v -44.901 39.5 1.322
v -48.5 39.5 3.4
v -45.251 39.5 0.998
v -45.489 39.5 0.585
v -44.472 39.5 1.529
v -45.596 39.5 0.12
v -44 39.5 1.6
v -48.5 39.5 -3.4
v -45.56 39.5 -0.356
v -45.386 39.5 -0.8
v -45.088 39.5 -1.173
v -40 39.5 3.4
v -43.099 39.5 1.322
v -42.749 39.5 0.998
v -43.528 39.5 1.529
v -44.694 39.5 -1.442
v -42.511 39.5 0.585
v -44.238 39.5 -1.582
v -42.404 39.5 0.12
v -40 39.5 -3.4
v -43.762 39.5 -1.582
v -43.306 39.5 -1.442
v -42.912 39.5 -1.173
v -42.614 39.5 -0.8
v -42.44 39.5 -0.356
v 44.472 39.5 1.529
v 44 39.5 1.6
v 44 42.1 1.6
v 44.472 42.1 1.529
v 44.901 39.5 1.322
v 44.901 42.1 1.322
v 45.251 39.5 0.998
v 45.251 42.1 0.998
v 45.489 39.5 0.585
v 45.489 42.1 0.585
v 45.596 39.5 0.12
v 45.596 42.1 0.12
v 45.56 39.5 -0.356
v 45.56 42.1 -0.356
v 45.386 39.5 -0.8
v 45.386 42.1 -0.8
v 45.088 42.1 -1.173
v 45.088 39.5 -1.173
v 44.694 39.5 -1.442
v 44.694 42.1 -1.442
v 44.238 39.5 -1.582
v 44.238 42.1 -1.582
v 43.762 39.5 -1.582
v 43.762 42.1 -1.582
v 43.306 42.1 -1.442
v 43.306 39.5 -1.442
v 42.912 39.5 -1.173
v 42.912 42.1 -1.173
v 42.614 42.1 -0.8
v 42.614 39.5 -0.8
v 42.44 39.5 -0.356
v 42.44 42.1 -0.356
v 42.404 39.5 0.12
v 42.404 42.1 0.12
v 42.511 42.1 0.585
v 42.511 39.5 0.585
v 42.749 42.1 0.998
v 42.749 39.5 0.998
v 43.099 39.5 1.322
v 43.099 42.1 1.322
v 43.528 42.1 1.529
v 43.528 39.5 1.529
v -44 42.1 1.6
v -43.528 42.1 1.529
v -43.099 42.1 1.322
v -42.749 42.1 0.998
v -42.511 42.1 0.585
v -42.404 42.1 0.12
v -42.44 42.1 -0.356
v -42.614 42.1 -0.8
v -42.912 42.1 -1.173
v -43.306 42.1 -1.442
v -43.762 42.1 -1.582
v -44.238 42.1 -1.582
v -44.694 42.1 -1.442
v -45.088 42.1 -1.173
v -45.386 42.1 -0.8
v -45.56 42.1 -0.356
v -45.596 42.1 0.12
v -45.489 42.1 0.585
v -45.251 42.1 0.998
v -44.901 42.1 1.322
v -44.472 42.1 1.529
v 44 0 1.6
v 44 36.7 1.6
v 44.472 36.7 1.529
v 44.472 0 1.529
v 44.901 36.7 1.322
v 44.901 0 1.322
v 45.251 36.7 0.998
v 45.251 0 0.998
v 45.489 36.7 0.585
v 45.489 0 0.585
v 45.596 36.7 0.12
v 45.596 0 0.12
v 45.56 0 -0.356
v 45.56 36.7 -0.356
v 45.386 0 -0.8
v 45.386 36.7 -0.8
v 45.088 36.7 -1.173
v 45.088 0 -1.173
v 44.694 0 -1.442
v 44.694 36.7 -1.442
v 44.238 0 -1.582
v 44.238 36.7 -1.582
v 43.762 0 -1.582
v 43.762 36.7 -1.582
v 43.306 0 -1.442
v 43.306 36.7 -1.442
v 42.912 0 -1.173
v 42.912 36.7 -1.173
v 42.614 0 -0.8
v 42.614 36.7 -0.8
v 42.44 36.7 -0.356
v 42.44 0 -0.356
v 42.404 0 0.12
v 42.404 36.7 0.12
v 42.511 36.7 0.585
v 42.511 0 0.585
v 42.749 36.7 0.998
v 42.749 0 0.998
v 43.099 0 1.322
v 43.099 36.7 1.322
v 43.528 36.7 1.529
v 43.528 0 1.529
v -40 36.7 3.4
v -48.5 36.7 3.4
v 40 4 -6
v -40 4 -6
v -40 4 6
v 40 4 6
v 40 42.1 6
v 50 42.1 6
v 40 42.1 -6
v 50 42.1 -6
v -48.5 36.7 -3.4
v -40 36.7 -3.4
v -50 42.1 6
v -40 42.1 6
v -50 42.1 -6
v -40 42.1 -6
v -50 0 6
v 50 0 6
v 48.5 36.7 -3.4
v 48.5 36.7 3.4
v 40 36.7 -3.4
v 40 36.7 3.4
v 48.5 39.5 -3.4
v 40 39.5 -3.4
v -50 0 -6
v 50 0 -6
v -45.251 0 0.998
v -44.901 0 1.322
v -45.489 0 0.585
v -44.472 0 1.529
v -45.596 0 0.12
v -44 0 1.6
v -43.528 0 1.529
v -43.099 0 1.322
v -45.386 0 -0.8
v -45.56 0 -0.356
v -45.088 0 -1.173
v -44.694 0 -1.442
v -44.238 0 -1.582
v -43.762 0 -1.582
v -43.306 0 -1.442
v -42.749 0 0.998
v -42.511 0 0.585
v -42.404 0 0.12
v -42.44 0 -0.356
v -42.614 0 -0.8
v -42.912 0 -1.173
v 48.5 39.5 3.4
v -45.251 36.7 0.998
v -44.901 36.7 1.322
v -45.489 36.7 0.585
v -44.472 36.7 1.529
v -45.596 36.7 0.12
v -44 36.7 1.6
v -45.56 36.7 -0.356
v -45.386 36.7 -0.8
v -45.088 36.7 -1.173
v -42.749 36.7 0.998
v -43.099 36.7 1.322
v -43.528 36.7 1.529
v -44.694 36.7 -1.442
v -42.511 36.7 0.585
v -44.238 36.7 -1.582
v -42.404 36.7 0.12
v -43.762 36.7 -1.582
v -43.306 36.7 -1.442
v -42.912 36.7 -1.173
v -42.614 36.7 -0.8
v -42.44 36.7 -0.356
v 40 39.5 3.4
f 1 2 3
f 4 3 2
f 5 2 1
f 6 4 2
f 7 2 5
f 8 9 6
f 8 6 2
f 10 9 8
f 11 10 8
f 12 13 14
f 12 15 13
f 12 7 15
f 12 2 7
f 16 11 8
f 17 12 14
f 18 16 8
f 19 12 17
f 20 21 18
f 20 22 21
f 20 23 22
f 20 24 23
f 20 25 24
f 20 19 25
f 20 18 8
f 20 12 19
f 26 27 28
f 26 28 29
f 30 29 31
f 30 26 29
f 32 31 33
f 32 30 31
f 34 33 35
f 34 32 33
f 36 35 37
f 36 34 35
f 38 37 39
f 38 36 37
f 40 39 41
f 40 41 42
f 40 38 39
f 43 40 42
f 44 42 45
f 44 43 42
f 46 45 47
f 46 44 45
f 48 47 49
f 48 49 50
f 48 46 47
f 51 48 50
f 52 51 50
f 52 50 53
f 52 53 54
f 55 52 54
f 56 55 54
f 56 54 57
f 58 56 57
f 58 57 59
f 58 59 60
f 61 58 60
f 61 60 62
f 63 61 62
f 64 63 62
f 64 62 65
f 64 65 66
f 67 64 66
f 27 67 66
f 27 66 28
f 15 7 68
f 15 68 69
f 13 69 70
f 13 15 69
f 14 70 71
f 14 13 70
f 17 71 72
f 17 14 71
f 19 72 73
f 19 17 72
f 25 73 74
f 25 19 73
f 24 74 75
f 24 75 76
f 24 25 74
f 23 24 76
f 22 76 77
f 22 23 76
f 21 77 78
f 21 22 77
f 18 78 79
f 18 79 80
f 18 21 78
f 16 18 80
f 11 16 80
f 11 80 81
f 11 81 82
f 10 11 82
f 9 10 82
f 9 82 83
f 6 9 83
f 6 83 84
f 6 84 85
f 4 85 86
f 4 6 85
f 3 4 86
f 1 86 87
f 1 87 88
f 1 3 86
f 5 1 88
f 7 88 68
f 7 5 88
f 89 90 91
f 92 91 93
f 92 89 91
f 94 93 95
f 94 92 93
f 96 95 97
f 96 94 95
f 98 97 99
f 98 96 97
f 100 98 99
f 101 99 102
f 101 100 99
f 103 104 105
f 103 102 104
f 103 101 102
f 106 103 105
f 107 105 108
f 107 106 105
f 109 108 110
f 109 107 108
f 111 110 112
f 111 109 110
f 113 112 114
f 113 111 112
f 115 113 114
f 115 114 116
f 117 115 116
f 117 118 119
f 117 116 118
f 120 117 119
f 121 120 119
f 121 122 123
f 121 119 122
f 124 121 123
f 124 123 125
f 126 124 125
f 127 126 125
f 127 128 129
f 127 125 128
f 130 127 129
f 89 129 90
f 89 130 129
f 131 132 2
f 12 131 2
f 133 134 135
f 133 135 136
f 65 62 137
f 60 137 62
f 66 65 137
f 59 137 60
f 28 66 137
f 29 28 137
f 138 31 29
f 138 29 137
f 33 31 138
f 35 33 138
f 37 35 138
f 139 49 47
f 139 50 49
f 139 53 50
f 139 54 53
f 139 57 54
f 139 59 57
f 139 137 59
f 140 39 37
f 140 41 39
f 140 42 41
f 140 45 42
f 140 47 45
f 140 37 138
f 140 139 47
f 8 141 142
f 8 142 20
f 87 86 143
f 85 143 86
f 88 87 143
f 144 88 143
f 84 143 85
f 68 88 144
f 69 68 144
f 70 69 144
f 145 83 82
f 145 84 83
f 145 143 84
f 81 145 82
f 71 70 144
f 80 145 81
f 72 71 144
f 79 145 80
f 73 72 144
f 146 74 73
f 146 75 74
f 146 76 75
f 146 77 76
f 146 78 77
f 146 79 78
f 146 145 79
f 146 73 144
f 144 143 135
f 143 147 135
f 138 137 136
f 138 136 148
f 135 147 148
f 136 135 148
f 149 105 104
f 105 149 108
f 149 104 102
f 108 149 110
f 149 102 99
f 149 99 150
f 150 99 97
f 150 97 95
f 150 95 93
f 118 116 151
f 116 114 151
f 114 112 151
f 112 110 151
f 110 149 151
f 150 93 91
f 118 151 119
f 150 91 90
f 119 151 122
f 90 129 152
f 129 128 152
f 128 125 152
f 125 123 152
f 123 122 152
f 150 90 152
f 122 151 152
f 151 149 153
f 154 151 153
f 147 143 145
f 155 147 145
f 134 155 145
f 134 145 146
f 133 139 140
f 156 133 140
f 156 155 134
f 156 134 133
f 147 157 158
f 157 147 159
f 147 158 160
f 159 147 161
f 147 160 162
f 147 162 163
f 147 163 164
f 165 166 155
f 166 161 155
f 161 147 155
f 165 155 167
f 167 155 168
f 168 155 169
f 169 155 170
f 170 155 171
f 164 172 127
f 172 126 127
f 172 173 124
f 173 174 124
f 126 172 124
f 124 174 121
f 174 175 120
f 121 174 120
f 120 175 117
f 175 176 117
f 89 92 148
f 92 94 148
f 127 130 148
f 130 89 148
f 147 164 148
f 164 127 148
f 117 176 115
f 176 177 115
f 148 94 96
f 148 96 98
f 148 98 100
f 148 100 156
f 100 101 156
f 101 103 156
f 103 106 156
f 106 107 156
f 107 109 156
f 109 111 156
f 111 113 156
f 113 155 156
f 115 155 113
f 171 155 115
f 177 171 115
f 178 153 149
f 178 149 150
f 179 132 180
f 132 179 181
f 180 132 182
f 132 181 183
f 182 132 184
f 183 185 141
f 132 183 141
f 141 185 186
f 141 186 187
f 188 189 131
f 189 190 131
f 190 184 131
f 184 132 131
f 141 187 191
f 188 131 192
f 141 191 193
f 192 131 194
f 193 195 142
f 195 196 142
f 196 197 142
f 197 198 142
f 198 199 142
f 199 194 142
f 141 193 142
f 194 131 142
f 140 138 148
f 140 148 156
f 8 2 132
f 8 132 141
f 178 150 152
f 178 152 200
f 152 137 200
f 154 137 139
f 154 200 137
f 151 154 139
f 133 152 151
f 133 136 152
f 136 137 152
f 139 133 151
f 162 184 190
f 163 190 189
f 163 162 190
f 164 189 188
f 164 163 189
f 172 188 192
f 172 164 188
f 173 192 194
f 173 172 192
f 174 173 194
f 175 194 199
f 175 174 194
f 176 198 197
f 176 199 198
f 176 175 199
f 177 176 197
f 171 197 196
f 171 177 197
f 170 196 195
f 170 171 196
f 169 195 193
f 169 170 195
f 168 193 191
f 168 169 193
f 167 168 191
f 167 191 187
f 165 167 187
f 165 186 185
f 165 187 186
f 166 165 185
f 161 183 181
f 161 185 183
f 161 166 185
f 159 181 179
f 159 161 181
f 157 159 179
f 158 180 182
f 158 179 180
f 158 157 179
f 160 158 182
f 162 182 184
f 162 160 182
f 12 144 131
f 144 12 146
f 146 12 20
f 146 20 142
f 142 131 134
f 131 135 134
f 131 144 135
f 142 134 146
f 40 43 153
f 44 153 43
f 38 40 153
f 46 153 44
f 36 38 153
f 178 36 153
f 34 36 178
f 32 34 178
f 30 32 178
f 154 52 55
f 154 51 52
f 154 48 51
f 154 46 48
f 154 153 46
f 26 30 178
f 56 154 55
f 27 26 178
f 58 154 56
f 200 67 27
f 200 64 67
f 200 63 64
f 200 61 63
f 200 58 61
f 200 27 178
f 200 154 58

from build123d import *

# Parameters (mm, degrees)
SKETCH2_W         = 100
SKETCH2_H         = 12
SKETCH2_R         = 1.6
BODY_DEPTH        = 4
SKETCH4_W         = 10
SKETCH4_H         = 12
SKETCH4_R         = 1.6
WINGS_DEPTH       = 38.1
SKETCH6_W         = 6.8
SKETCH6_H         = 2.8
CAPTIVE_NUT_DEPTH = 8.5
CIRPATTERN1_COUNT = 2


with BuildPart() as part:
    # Sketch2 → body (new body)
    with BuildSketch(Plane(origin=(0, 0, 0), x_dir=(1, 0, 0), z_dir=(0, 1, 0))):
        Rectangle(SKETCH2_W, SKETCH2_H)
        with Locations(Location((-44, 0, 0), (0, 0, 270))):
            Circle(SKETCH2_R, mode=Mode.SUBTRACT)
        with Locations(Location((44, 0, 0), (0, 0, 270))):
            Circle(SKETCH2_R, mode=Mode.SUBTRACT)
    extrude(amount=BODY_DEPTH)

    # Sketch4 → wings (add)
    # profile 1 of 2: a face of its own
    with BuildSketch(Plane(origin=(0, 4, 0), x_dir=(1, 0, 0), z_dir=(0, 1, 0))):
        with Locations((-45, 0)):
            Rectangle(SKETCH4_W, SKETCH4_H)
        with Locations(Location((-44, 0, 0), (0, 0, 270))):
            Circle(SKETCH4_R, mode=Mode.SUBTRACT)
    # profile 2 of 2: a face of its own
    with BuildSketch(Plane(origin=(0, 4, 0), x_dir=(1, 0, 0), z_dir=(0, 1, 0))):
        with Locations((45, 0)):
            Rectangle(SKETCH4_W, SKETCH4_H)
        with Locations(Location((44, 0, 0), (0, 0, 270))):
            Circle(SKETCH4_R, mode=Mode.SUBTRACT)
    extrude(amount=WINGS_DEPTH)

    # Sketch6 → captive-nut (cut)
    with BuildSketch(Plane.ZY.offset(-40)):
        with Locations((0, 38.1)):
            Rectangle(SKETCH6_W, SKETCH6_H)
    captive_nut = extrude(amount=-CAPTIVE_NUT_DEPTH, mode=Mode.SUBTRACT)

    # CirPattern1: captive-nut ×2 about axis
    cirpattern1_axis = Axis((0, 0, 0), (0, 1, 0))
    for i in range(1, CIRPATTERN1_COUNT):
        add(captive_nut.rotate(cirpattern1_axis, i * 360 / CIRPATTERN1_COUNT), mode=Mode.SUBTRACT)


solid = part.part
